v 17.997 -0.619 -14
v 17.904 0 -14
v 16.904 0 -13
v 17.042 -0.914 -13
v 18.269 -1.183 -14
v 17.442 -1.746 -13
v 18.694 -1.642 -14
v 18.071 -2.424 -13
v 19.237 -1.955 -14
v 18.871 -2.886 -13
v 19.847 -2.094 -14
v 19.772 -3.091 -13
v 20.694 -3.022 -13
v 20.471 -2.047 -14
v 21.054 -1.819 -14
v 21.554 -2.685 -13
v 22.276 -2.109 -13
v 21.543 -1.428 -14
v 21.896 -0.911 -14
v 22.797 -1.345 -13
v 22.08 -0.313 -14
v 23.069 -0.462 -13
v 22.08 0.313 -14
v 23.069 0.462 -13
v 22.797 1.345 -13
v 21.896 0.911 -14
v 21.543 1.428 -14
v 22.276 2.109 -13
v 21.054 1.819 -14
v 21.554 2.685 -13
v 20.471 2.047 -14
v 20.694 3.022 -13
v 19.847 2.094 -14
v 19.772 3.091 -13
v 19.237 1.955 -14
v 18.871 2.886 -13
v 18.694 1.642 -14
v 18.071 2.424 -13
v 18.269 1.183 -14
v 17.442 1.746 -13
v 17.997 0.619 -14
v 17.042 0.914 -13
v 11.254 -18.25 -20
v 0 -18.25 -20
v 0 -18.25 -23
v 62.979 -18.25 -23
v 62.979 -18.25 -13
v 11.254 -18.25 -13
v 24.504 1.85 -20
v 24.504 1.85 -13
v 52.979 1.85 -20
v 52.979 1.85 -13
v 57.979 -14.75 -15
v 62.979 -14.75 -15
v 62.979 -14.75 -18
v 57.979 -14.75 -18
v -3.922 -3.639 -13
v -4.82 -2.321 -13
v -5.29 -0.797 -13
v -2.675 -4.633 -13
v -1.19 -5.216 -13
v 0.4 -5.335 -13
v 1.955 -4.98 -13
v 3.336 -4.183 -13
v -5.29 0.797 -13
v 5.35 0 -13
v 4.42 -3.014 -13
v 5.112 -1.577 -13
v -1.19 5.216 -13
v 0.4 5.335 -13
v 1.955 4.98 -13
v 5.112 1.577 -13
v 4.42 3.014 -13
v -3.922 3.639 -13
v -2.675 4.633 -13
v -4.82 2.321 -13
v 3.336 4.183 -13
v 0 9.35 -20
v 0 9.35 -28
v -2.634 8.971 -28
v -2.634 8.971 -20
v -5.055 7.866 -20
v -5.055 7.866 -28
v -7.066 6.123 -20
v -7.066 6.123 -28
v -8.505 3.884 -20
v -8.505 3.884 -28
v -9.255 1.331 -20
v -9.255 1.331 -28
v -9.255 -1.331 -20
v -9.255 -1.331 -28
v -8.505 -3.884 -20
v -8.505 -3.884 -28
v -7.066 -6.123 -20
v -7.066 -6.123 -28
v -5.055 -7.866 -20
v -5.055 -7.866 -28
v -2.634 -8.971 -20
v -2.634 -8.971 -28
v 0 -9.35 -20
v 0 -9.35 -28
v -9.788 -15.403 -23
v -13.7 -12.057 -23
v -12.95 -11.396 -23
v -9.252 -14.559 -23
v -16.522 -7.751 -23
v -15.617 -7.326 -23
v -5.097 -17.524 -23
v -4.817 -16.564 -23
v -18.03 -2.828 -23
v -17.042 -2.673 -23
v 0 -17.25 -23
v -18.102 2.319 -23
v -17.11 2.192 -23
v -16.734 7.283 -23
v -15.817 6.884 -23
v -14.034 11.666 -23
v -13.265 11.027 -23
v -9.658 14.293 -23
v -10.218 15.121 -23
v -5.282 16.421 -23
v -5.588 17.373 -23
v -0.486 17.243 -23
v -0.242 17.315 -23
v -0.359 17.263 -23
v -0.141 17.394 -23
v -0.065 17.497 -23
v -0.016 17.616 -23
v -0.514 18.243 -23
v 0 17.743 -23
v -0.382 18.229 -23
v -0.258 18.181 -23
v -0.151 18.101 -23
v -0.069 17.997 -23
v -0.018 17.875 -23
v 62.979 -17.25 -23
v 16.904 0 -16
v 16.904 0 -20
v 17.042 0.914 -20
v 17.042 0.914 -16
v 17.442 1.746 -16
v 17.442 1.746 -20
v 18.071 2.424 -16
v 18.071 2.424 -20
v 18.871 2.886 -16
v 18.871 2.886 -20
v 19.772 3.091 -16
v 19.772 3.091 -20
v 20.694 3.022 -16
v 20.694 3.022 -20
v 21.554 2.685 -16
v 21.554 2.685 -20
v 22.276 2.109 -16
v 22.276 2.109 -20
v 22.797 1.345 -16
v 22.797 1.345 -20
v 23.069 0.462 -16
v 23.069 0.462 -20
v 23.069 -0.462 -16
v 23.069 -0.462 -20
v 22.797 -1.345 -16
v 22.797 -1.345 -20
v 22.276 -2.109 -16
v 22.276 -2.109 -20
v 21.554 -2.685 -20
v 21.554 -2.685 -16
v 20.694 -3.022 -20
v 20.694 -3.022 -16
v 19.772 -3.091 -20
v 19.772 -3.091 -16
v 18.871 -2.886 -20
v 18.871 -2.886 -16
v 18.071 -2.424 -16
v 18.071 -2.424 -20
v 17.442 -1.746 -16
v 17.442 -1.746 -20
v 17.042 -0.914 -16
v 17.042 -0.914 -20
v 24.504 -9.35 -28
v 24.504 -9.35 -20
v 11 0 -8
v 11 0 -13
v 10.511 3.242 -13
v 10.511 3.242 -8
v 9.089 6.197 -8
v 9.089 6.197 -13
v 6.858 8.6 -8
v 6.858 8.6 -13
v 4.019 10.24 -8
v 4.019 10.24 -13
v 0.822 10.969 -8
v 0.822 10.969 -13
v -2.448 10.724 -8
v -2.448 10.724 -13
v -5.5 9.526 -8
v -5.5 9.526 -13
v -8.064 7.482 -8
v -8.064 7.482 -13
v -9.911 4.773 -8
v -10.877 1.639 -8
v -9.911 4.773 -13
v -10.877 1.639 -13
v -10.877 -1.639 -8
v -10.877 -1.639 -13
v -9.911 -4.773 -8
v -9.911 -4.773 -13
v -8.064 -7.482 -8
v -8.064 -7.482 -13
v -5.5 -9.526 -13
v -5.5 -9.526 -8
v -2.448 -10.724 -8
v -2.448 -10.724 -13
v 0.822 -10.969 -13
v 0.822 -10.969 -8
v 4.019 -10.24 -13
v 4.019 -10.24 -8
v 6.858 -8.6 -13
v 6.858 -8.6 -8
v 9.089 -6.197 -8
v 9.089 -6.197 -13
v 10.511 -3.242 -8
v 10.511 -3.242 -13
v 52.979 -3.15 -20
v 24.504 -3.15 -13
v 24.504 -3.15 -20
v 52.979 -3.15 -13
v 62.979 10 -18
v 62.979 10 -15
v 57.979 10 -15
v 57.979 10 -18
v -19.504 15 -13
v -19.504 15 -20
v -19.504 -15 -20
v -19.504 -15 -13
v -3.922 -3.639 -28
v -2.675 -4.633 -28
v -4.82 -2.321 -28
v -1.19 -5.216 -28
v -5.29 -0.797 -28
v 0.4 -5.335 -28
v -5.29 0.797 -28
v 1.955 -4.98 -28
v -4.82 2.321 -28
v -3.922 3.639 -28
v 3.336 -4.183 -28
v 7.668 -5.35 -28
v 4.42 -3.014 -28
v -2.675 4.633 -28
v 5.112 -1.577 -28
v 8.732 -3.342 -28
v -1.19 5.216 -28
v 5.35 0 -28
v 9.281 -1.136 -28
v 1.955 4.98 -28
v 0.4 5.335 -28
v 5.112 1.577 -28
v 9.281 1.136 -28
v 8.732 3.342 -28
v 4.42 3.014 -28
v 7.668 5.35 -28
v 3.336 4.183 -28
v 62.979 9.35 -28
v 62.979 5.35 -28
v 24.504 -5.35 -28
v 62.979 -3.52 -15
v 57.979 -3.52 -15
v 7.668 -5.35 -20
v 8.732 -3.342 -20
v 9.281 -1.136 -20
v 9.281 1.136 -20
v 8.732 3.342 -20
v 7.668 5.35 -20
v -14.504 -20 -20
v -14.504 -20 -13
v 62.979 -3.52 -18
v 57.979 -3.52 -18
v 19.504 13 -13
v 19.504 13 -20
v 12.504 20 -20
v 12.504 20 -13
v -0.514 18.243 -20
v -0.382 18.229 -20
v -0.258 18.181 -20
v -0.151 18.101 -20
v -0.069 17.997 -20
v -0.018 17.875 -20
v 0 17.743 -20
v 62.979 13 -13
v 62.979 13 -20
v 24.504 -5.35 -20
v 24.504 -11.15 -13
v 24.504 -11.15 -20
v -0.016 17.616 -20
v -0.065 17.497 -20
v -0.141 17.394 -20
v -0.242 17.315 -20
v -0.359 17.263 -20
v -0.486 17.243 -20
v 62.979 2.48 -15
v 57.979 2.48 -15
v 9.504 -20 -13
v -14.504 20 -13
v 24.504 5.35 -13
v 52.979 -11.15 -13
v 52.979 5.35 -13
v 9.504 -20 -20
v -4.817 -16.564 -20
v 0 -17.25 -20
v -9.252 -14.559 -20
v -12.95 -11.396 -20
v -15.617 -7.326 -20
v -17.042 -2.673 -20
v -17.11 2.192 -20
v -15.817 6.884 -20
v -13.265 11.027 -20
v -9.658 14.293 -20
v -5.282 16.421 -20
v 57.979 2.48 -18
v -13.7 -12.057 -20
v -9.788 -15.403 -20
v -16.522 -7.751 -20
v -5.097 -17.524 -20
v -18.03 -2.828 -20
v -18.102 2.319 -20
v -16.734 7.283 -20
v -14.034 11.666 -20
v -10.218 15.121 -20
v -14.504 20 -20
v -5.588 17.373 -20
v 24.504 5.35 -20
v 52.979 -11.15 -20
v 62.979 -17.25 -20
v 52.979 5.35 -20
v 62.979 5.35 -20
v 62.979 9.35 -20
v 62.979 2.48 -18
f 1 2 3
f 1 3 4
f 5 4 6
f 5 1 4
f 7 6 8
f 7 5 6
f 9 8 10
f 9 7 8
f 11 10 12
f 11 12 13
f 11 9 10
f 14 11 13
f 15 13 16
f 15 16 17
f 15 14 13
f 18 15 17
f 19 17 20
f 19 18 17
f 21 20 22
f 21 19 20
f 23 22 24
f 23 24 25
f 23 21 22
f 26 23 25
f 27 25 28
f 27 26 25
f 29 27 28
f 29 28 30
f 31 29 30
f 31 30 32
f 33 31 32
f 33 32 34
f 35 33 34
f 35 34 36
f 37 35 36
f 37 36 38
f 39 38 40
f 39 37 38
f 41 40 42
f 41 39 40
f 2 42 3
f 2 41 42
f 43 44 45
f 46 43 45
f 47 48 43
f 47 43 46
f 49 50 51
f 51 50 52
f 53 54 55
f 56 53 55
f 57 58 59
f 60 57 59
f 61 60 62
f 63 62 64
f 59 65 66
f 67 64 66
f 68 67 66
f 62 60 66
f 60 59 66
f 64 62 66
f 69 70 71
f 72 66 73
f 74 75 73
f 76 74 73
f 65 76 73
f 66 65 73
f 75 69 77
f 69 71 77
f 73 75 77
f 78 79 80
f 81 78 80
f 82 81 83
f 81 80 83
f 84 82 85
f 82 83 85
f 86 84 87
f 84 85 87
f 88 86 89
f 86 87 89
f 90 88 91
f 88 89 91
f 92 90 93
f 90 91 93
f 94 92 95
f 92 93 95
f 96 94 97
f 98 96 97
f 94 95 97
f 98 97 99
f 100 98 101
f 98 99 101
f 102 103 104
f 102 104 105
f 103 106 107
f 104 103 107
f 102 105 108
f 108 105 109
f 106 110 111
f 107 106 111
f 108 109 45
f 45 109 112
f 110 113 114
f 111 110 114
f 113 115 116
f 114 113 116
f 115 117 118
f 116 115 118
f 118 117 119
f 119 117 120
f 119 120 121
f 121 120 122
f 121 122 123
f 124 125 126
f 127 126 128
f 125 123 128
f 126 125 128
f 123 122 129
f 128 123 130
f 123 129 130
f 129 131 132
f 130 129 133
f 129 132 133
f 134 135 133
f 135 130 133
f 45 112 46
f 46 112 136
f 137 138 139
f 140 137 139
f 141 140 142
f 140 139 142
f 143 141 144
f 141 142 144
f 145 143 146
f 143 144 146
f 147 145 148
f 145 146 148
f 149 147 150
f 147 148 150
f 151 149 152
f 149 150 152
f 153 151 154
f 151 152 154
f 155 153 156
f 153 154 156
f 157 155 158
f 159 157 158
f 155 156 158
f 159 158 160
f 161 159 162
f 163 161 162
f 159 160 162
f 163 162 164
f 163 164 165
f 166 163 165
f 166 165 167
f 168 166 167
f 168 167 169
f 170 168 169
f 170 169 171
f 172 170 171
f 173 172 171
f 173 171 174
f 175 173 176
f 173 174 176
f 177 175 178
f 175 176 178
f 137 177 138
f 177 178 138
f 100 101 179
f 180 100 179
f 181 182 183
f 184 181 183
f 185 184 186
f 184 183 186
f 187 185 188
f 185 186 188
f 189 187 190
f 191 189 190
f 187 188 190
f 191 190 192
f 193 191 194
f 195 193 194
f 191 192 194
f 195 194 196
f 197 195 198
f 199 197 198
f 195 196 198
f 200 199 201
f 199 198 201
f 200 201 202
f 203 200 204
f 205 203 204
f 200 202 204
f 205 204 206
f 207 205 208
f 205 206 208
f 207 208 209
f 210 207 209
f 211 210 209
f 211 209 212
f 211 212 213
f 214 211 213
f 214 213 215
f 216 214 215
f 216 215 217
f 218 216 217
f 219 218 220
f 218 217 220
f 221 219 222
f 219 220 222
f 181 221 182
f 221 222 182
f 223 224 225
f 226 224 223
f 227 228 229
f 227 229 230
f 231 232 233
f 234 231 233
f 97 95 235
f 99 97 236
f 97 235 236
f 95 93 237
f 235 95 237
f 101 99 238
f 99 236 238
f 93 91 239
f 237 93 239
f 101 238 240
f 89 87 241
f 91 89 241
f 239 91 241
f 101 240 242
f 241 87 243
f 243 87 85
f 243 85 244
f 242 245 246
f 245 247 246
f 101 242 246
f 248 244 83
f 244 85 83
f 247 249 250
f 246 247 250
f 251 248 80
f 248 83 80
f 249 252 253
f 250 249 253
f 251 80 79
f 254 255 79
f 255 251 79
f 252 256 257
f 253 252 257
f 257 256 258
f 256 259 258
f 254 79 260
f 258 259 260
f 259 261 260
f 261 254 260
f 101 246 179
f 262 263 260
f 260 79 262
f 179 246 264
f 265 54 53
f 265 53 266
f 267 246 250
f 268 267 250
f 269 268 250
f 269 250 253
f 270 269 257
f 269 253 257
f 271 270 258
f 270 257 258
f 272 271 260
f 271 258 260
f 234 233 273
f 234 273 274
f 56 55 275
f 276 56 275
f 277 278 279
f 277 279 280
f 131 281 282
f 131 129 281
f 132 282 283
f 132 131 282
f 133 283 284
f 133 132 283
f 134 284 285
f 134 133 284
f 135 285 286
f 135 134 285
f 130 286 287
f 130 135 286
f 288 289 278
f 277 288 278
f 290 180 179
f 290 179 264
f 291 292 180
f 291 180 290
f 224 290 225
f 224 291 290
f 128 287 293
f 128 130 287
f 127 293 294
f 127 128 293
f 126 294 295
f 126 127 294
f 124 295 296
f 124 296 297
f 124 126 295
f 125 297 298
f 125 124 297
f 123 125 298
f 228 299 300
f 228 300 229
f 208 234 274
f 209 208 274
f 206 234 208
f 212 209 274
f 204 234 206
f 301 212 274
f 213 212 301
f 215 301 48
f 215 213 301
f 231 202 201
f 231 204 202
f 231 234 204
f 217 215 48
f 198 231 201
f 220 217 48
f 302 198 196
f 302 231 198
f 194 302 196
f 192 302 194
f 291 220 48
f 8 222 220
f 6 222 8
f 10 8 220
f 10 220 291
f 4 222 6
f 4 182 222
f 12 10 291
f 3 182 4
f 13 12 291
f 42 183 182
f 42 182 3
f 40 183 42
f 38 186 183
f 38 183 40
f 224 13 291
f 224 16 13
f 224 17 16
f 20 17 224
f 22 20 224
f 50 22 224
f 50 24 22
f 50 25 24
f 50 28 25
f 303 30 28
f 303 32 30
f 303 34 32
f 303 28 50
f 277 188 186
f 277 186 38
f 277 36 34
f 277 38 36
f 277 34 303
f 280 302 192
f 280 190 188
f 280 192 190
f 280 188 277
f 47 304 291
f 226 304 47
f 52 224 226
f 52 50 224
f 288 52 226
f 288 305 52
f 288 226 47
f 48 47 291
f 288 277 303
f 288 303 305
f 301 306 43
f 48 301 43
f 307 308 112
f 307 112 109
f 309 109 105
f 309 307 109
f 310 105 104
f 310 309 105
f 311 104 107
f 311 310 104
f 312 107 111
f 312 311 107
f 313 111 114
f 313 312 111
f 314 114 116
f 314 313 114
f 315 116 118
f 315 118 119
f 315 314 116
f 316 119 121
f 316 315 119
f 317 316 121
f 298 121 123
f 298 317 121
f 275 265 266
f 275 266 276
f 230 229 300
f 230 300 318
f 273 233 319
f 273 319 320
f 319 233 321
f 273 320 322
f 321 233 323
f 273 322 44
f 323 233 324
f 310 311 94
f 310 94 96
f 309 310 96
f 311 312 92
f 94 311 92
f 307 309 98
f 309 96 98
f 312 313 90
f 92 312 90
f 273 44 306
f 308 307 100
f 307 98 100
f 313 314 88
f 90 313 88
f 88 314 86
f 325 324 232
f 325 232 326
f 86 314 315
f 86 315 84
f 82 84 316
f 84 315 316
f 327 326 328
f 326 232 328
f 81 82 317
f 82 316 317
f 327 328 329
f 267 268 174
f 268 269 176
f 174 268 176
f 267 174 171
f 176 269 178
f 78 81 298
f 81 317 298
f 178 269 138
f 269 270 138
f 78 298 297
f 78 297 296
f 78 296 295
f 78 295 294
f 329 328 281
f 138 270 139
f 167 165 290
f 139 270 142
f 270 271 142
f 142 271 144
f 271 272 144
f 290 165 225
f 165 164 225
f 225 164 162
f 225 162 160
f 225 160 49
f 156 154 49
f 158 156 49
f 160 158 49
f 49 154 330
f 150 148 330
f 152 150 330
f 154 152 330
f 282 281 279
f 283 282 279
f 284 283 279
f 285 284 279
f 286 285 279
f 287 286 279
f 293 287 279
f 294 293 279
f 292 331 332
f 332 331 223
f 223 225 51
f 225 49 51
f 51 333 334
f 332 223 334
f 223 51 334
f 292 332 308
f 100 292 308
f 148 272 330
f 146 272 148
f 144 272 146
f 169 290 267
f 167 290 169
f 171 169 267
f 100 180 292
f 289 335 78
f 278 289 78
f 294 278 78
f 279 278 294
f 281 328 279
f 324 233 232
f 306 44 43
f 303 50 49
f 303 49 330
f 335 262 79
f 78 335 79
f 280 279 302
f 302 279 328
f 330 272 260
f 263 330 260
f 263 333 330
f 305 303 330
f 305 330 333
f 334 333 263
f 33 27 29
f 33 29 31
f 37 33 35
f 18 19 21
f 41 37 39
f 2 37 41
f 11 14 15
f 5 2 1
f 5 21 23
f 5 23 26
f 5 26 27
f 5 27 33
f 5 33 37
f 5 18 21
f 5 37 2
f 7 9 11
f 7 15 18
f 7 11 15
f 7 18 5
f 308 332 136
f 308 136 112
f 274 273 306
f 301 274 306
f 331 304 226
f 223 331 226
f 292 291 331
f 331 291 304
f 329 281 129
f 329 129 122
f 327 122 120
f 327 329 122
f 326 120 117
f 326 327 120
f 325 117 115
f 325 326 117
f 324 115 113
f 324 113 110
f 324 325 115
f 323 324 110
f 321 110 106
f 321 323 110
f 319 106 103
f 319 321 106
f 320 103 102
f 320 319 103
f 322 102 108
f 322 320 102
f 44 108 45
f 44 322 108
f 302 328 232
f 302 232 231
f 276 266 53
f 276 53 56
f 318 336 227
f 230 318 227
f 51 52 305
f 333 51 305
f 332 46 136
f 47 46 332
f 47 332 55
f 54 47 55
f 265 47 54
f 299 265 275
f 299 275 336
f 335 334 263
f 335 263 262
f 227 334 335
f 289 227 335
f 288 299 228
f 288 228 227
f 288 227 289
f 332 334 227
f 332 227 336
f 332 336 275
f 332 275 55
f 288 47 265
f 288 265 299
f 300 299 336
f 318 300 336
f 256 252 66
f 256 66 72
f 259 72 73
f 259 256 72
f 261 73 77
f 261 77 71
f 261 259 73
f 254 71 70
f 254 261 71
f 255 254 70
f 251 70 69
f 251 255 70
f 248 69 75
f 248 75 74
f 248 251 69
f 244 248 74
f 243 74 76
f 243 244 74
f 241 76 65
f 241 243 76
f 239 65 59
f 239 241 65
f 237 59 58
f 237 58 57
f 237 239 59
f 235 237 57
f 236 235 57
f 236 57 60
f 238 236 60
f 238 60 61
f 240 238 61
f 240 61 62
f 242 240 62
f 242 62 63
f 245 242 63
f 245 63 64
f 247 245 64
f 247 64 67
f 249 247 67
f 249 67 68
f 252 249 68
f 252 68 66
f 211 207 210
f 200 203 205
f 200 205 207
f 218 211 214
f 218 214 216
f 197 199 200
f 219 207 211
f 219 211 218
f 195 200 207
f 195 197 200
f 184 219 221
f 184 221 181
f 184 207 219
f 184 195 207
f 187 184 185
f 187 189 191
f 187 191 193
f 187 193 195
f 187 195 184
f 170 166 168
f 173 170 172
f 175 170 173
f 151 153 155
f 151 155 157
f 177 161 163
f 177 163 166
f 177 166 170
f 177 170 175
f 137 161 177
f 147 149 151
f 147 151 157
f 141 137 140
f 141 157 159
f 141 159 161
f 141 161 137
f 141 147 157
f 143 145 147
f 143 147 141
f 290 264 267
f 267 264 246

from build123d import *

# Parameters (mm, degrees)
SKETCH1_R               = 5.35
BOSS_EXTRUDE2_DEPTH     = 7
BOSS_EXTRUDE3_START     = 8
SKETCH3_R               = 5.35
BOSS_EXTRUDE3_DEPTH     = 8
BOSS_EXTRUDE4_DEPTH     = 3
CHAMFER1_SIZE           = 10
CHAMFER2_SIZE           = 5
CUT_EXTRUDE1_DEPTH      = 67.560662475
CUT_EXTRUDE1_DEPTH_BACK = 67.560662475
SKETCH5_W               = 28.474956737
SKETCH5_H               = 3.5
SKETCH5_H_2             = 8
CHAMFER3_SIZE           = 7
SKETCH6_R               = 11
BOSS_EXTRUDE5_DEPTH     = 5
SKETCH8_W               = 3
SKETCH8_H               = 7.519820499
SKETCH8_H_2             = 11.230179501
CUT_EXTRUDE2_DEPTH      = 5
CUT_EXTRUDE3_REACH      = 91.372
SKETCH9_W               = 8
SKETCH9_H               = 4
SKETCH10_R              = 3.1
CUT_EXTRUDE4_DEPTH      = 4
SKETCH11_R              = 3.1
CUT_EXTRUDE5_DEPTH      = 1
CHAMFER4_SIZE           = 1
FILLET1_R               = 0.5


# Some blends are built 0.0001 mm under size
with BuildPart() as part:
    # Sketch1 → Boss-Extrude2 (new body)
    with BuildSketch(Plane.XY):
        Polygon((-19.503784034, -20), (19.503784034, -20), (19.503784034, -18.25), (62.978740771, -18.25), (62.978740771, 13), (19.503784034, 13), (19.503784034, 20), (-19.503784034, 20), align=None)
        Circle(SKETCH1_R, mode=Mode.SUBTRACT)
    extrude(amount=-BOSS_EXTRUDE2_DEPTH)

    # Sketch3 → Boss-Extrude3 (add)
    with BuildSketch(Plane.XY.offset(BOSS_EXTRUDE3_START)):
        with BuildLine():
            Line((7.668115805, 5.35), (62.978740771, 5.35))
            Line((62.978740771, 5.35), (62.978740771, 9.35))
            Line((62.978740771, 9.35), (0, 9.35))
            ThreePointArc((0, 9.35), (-9.35, 0), (0, -9.35))
            Line((0, -9.35), (62.978740771, -9.35))
            Line((62.978740771, -9.35), (62.978740771, -5.35))
            Line((62.978740771, -5.35), (7.668115805, -5.35))
            ThreePointArc((7.668115805, -5.35), (9.35, 0), (7.668115805, 5.35))
        make_face()
        Circle(SKETCH3_R, mode=Mode.SUBTRACT)
    extrude(amount=-BOSS_EXTRUDE3_DEPTH)

    # Sketch4 → Boss-Extrude4 (add)
    with BuildSketch(Plane.XY):
        with BuildLine():
            Line((0, -18.25), (62.978740771, -18.25))
            Line((62.978740771, -18.25), (62.978740771, -17.25))
            Line((62.978740771, -17.25), (8.306623863, -17.25))
            Line((8.306623863, -17.25), (0, -17.25))
            ThreePointArc((0, -17.25), (-17.25, 0), (0, 17.25))
            Line((0, 17.25), (0, 18.25))
            ThreePointArc((0, 18.25), (-18.25, 0), (0, -18.25))
        make_face()
    extrude(amount=BOSS_EXTRUDE4_DEPTH)

    # Chamfer1
    # the kernel refuses this chamfer: 10 mm, written as the material it takes off along each edge
    with BuildSketch(Plane(origin=(19.503784034, -20, 25.71682988), x_dir=(-0.9996219169112968, -0.027495876610586317, 0), z_dir=(0, 0, -1))) as chamfer1_piece_1_section:
        Polygon((CHAMFER1_SIZE * 0.999621916911, CHAMFER1_SIZE * 0.0274958766106), (-CHAMFER1_SIZE * 0.0274958766106, CHAMFER1_SIZE * 0.999621916911), (0, 0), align=None)
    chamfer1_piece_1 = extrude(amount=58.433659759, mode=Mode.PRIVATE)
    chamfer1_piece_1 = split(chamfer1_piece_1, bisect_by=Plane(origin=(14.814200223, -18.25, -3.5), z_dir=(0, -1, 0)), keep=Keep.TOP, mode=Mode.PRIVATE)
    add(chamfer1_piece_1, mode=Mode.SUBTRACT)

    # Chamfer2
    chamfer2_edges = [part.edges().sort_by_distance(p)[0] for p in [
        (-19.503784034, -20, -3.5),
        (-19.503784034, 20, -3.5),
    ]]
    chamfer(chamfer2_edges, length=CHAMFER2_SIZE)

    # Sketch5 → Cut-Extrude1 (cut, two sides: drawn at the far end of the back side and taken through both)
    with BuildSketch(Plane.XY.offset(-CUT_EXTRUDE1_DEPTH_BACK)):
        with Locations((38.741262403, 3.6)):
            Rectangle(SKETCH5_W, SKETCH5_H)
        with Locations((38.741262403, -7.15)):
            Rectangle(SKETCH5_W, SKETCH5_H_2)
    extrude(amount=CUT_EXTRUDE1_DEPTH + CUT_EXTRUDE1_DEPTH_BACK, mode=Mode.SUBTRACT)

    # Chamfer3
    chamfer3_edges = [part.edges().sort_by_distance(p)[0] for p in [
        (19.503784034, 20, -3.5),
    ]]
    chamfer(chamfer3_edges, length=CHAMFER3_SIZE - 0.0001)  # a hair under: the kernel refuses the full size


with BuildPart() as body_2:
    # Mirror9: mirrored copy
    add(part.part.mirror(Plane.XY.offset(-10)))

    # Sketch6 → Boss-Extrude5 (add)
    with BuildSketch(Plane.XY.offset(-13)):
        Circle(SKETCH6_R)
    extrude(amount=BOSS_EXTRUDE5_DEPTH)

    # Sketch8 → Cut-Extrude2 (cut)
    with BuildSketch(Plane(origin=(62.978740771, 0, 0), x_dir=(0, 0, -1), z_dir=(1, 0, 0))):
        with Locations((16.5, 6.240089751)):
            Rectangle(SKETCH8_W, SKETCH8_H)
        with Locations((16.5, -9.13491025)):
            Rectangle(SKETCH8_W, SKETCH8_H_2)
    extrude(amount=-CUT_EXTRUDE2_DEPTH, mode=Mode.SUBTRACT)

    # Sketch9 → Cut-Extrude3 (cut, up to next)
    with BuildSketch(Plane(origin=(62.978740771, 0, 0), x_dir=(0, 0, -1), z_dir=(1, 0, 0)), mode=Mode.PRIVATE) as cut_extrude3_sk1:
        with Locations((24, -7.35)):
            Rectangle(SKETCH9_W, SKETCH9_H)
    cut_extrude3_tool1 = extrude(cut_extrude3_sk1.sketch, amount=-CUT_EXTRUDE3_REACH, mode=Mode.PRIVATE) & body_2.part
    add(cut_extrude3_tool1.solids().sort_by_distance((62.978741, -7.35, -24))[0], mode=Mode.SUBTRACT)

    # Sketch10 → Cut-Extrude4 (cut)
    with BuildSketch(Plane(origin=(0, 0, -20), x_dir=(-1, 0, 0), z_dir=(0, 0, -1))):
        with Locations((-20.003784034, 0)):
            Circle(SKETCH10_R)
    extrude(amount=-CUT_EXTRUDE4_DEPTH, mode=Mode.SUBTRACT)

    # Sketch11 → Cut-Extrude5 (cut)
    with BuildSketch(Plane.XY.offset(-13)):
        with Locations(Location((20.003784034, 0, 0), (0, 0, 180))):
            Circle(SKETCH11_R)
    extrude(amount=-CUT_EXTRUDE5_DEPTH, mode=Mode.SUBTRACT)

    # Chamfer4
    chamfer4_edges = [body_2.edges().sort_by_distance(p)[0] for p in [
        (23.103784034, 0, -14),
    ]]
    chamfer(chamfer4_edges, length=CHAMFER4_SIZE - 0.0001)  # a hair under: the kernel refuses the full size

    # Fillet1
    fillet1_edges = [body_2.edges().sort_by_distance(p)[0] for p in [
        (0, 18.25, -21.5),
        (0, 17.25, -21.5),
    ]]
    fillet(fillet1_edges, radius=FILLET1_R - 0.0001)  # a hair under: the kernel refuses the full size


solid = body_2.part
